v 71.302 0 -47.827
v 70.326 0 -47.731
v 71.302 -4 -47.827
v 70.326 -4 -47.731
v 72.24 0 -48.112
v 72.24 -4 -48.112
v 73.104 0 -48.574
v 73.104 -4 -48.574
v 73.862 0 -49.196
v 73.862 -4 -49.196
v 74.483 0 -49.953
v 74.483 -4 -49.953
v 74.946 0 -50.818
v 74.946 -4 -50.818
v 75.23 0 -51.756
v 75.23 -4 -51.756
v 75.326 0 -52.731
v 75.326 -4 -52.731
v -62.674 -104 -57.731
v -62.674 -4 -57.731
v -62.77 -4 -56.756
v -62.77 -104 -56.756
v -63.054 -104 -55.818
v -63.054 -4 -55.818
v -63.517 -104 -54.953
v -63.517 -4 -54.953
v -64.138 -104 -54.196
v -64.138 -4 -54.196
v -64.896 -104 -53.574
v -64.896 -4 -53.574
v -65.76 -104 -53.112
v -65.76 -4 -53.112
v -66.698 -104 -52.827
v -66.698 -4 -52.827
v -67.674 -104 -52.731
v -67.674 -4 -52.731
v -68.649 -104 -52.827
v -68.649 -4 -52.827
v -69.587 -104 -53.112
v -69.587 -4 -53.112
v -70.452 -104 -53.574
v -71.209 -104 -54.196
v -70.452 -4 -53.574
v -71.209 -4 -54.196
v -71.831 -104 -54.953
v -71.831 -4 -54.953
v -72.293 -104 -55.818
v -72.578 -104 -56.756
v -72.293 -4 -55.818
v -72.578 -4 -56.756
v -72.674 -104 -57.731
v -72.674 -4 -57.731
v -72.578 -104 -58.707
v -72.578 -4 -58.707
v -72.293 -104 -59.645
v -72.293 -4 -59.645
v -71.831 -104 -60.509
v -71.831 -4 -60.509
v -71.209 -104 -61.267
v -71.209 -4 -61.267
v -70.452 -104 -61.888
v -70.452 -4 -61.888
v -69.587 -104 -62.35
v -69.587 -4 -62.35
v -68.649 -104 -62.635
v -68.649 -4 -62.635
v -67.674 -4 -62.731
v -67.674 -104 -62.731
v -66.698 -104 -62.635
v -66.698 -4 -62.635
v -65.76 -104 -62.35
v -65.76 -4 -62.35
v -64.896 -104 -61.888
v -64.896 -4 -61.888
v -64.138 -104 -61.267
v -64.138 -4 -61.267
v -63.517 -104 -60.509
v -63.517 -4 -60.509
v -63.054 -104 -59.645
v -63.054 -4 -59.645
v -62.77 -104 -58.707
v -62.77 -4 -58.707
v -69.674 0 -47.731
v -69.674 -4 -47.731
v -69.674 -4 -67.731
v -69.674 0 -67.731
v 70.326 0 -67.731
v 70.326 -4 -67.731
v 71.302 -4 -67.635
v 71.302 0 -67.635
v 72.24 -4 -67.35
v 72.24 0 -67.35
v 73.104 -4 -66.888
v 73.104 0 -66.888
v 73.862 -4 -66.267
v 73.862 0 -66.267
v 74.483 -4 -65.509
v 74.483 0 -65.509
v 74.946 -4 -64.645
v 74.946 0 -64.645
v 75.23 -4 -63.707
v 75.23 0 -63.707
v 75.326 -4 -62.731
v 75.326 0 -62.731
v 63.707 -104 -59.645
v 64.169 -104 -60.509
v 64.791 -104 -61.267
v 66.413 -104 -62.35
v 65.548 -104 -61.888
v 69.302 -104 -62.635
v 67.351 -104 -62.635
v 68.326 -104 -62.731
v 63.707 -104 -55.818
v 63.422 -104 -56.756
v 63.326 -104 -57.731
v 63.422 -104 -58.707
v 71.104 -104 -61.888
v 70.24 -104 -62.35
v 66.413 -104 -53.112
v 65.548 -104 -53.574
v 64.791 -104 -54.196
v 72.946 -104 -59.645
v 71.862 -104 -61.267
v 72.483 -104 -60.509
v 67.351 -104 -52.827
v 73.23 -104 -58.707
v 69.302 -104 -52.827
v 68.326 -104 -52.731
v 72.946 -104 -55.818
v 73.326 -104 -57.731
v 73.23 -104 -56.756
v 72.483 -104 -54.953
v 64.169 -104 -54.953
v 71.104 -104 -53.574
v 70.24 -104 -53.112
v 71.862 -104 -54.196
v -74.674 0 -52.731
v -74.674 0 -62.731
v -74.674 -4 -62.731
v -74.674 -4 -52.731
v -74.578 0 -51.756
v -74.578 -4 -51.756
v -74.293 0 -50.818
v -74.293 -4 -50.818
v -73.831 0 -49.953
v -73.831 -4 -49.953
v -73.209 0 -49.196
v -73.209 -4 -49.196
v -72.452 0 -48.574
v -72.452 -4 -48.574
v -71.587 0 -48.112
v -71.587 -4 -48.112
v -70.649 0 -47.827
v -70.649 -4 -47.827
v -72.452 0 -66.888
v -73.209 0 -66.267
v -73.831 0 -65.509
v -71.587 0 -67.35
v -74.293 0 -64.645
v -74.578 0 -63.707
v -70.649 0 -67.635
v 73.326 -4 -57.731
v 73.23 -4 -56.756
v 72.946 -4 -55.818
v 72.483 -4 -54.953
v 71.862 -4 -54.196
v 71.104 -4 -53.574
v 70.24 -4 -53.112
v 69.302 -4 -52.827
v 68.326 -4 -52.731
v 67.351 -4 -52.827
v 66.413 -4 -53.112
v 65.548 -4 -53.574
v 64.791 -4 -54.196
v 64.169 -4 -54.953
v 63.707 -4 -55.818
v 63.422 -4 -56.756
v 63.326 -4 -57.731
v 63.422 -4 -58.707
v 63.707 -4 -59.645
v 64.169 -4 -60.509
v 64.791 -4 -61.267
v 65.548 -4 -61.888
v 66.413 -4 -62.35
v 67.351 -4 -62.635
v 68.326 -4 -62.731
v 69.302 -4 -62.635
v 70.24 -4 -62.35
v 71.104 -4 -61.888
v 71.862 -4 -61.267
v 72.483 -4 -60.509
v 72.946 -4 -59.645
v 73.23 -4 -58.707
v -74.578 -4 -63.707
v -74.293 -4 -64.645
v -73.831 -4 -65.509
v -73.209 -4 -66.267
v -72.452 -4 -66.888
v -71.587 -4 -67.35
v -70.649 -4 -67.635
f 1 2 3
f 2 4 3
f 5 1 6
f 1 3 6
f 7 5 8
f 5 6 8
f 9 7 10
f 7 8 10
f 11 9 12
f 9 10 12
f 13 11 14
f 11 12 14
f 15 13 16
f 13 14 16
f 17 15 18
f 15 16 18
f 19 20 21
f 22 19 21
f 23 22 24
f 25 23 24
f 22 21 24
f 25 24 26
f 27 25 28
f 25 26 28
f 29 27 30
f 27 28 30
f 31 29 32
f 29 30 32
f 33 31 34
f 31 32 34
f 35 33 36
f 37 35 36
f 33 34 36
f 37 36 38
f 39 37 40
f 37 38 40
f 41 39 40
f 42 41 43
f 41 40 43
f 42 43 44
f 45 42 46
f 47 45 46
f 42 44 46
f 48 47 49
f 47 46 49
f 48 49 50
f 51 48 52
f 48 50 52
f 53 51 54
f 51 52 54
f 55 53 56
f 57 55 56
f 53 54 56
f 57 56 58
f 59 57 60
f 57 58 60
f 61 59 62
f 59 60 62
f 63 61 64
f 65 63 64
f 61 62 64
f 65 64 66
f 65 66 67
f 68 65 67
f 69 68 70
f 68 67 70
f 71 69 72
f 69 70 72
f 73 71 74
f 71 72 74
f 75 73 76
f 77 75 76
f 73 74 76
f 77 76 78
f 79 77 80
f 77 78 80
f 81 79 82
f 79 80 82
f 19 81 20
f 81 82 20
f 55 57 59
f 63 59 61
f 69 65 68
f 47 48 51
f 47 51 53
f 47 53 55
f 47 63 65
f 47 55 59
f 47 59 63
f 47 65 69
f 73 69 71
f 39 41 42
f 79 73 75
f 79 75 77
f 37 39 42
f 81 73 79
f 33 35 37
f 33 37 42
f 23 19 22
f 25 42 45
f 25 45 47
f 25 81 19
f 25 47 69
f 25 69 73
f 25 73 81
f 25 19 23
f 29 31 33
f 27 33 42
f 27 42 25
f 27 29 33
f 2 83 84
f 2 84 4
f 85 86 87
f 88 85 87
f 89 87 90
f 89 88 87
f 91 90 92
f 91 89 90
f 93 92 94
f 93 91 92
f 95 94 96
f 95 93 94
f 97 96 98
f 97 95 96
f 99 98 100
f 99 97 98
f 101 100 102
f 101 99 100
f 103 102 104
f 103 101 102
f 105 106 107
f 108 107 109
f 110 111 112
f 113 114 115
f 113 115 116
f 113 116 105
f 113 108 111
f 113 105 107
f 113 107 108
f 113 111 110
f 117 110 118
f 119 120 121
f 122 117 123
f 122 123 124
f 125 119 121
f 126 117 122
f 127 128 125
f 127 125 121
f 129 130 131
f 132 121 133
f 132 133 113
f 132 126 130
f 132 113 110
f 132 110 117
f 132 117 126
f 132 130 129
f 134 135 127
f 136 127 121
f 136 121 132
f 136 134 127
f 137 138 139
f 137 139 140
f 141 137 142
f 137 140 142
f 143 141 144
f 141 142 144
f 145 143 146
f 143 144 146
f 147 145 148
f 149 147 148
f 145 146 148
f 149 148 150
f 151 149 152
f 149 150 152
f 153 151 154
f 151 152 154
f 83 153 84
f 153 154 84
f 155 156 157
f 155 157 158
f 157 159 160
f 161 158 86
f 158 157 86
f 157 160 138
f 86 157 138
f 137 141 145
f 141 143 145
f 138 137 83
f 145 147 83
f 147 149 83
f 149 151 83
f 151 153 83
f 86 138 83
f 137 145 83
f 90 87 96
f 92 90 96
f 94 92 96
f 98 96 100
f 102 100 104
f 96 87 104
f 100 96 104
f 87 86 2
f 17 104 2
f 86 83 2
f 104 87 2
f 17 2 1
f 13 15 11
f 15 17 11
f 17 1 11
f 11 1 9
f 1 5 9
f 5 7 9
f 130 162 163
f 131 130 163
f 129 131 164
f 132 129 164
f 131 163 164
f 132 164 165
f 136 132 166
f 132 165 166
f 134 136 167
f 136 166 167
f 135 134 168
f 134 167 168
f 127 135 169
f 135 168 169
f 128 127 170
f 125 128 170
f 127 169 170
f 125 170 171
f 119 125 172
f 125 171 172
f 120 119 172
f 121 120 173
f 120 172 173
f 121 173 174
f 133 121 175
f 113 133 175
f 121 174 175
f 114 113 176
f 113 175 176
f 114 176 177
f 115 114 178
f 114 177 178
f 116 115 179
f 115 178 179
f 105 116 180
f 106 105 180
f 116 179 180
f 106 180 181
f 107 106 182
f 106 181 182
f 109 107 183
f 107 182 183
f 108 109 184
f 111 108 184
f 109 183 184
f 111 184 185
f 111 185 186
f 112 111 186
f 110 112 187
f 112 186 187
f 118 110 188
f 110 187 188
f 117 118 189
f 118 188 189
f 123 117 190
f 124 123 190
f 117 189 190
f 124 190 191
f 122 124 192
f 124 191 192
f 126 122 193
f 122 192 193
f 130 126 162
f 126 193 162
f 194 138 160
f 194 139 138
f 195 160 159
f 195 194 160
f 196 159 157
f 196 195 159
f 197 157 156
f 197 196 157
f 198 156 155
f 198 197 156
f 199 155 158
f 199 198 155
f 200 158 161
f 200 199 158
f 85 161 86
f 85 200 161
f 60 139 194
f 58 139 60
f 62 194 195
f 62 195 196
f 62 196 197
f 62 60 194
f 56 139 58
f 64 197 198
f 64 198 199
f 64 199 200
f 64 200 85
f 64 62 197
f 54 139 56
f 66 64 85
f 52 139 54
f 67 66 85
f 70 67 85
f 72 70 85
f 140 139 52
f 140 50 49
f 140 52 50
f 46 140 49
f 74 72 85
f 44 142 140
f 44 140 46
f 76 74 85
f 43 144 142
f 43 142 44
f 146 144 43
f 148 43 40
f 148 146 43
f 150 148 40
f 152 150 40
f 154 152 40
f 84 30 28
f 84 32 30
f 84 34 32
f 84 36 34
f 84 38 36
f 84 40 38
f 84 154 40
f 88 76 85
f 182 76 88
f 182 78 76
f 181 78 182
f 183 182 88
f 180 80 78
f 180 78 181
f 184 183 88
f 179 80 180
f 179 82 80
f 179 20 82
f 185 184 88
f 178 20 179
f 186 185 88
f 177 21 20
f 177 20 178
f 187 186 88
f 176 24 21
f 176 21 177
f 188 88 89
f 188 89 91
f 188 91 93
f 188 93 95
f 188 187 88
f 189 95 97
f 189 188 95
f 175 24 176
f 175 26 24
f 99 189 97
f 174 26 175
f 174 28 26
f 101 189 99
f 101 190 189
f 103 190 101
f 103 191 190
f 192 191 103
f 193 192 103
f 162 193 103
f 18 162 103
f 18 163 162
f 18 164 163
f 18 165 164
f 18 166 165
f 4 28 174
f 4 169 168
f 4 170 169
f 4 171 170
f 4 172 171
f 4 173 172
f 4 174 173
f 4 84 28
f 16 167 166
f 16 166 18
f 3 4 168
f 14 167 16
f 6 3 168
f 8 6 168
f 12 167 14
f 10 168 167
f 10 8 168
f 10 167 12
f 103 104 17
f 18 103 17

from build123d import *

# Parameters (mm, degrees)
F0_W     = 150
F0_H     = 20
F1_DEPTH = 4
F2_R     = 5
F3_DEPTH = 100
F4_R     = 5


with BuildPart() as f1:
    # F0 (on Front) → F1 (new body)
    with BuildSketch(Plane.XZ):
        with Locations((0.326128, -57.731088)):
            Rectangle(F0_W, F0_H)
    extrude(amount=F1_DEPTH)

    # F2 (on face) → F3 (join)
    with BuildSketch(Plane.XZ.offset(4)):
        with Locations((68.326128, -57.731088)):
            Circle(F2_R)
        with Locations((-67.673872, -57.731088)):
            Circle(F2_R)
    extrude(amount=F3_DEPTH)

    # F4
    f4_edges = [f1.edges().sort_by_distance(p)[0] for p in [
        (-74.673872, -2, -67.731088),
        (-74.673872, -2, -47.731088),
        (75.326128, -2, -67.731088),
        (75.326128, -2, -47.731088),
    ]]
    fillet(f4_edges, radius=F4_R)


solid = f1.part
